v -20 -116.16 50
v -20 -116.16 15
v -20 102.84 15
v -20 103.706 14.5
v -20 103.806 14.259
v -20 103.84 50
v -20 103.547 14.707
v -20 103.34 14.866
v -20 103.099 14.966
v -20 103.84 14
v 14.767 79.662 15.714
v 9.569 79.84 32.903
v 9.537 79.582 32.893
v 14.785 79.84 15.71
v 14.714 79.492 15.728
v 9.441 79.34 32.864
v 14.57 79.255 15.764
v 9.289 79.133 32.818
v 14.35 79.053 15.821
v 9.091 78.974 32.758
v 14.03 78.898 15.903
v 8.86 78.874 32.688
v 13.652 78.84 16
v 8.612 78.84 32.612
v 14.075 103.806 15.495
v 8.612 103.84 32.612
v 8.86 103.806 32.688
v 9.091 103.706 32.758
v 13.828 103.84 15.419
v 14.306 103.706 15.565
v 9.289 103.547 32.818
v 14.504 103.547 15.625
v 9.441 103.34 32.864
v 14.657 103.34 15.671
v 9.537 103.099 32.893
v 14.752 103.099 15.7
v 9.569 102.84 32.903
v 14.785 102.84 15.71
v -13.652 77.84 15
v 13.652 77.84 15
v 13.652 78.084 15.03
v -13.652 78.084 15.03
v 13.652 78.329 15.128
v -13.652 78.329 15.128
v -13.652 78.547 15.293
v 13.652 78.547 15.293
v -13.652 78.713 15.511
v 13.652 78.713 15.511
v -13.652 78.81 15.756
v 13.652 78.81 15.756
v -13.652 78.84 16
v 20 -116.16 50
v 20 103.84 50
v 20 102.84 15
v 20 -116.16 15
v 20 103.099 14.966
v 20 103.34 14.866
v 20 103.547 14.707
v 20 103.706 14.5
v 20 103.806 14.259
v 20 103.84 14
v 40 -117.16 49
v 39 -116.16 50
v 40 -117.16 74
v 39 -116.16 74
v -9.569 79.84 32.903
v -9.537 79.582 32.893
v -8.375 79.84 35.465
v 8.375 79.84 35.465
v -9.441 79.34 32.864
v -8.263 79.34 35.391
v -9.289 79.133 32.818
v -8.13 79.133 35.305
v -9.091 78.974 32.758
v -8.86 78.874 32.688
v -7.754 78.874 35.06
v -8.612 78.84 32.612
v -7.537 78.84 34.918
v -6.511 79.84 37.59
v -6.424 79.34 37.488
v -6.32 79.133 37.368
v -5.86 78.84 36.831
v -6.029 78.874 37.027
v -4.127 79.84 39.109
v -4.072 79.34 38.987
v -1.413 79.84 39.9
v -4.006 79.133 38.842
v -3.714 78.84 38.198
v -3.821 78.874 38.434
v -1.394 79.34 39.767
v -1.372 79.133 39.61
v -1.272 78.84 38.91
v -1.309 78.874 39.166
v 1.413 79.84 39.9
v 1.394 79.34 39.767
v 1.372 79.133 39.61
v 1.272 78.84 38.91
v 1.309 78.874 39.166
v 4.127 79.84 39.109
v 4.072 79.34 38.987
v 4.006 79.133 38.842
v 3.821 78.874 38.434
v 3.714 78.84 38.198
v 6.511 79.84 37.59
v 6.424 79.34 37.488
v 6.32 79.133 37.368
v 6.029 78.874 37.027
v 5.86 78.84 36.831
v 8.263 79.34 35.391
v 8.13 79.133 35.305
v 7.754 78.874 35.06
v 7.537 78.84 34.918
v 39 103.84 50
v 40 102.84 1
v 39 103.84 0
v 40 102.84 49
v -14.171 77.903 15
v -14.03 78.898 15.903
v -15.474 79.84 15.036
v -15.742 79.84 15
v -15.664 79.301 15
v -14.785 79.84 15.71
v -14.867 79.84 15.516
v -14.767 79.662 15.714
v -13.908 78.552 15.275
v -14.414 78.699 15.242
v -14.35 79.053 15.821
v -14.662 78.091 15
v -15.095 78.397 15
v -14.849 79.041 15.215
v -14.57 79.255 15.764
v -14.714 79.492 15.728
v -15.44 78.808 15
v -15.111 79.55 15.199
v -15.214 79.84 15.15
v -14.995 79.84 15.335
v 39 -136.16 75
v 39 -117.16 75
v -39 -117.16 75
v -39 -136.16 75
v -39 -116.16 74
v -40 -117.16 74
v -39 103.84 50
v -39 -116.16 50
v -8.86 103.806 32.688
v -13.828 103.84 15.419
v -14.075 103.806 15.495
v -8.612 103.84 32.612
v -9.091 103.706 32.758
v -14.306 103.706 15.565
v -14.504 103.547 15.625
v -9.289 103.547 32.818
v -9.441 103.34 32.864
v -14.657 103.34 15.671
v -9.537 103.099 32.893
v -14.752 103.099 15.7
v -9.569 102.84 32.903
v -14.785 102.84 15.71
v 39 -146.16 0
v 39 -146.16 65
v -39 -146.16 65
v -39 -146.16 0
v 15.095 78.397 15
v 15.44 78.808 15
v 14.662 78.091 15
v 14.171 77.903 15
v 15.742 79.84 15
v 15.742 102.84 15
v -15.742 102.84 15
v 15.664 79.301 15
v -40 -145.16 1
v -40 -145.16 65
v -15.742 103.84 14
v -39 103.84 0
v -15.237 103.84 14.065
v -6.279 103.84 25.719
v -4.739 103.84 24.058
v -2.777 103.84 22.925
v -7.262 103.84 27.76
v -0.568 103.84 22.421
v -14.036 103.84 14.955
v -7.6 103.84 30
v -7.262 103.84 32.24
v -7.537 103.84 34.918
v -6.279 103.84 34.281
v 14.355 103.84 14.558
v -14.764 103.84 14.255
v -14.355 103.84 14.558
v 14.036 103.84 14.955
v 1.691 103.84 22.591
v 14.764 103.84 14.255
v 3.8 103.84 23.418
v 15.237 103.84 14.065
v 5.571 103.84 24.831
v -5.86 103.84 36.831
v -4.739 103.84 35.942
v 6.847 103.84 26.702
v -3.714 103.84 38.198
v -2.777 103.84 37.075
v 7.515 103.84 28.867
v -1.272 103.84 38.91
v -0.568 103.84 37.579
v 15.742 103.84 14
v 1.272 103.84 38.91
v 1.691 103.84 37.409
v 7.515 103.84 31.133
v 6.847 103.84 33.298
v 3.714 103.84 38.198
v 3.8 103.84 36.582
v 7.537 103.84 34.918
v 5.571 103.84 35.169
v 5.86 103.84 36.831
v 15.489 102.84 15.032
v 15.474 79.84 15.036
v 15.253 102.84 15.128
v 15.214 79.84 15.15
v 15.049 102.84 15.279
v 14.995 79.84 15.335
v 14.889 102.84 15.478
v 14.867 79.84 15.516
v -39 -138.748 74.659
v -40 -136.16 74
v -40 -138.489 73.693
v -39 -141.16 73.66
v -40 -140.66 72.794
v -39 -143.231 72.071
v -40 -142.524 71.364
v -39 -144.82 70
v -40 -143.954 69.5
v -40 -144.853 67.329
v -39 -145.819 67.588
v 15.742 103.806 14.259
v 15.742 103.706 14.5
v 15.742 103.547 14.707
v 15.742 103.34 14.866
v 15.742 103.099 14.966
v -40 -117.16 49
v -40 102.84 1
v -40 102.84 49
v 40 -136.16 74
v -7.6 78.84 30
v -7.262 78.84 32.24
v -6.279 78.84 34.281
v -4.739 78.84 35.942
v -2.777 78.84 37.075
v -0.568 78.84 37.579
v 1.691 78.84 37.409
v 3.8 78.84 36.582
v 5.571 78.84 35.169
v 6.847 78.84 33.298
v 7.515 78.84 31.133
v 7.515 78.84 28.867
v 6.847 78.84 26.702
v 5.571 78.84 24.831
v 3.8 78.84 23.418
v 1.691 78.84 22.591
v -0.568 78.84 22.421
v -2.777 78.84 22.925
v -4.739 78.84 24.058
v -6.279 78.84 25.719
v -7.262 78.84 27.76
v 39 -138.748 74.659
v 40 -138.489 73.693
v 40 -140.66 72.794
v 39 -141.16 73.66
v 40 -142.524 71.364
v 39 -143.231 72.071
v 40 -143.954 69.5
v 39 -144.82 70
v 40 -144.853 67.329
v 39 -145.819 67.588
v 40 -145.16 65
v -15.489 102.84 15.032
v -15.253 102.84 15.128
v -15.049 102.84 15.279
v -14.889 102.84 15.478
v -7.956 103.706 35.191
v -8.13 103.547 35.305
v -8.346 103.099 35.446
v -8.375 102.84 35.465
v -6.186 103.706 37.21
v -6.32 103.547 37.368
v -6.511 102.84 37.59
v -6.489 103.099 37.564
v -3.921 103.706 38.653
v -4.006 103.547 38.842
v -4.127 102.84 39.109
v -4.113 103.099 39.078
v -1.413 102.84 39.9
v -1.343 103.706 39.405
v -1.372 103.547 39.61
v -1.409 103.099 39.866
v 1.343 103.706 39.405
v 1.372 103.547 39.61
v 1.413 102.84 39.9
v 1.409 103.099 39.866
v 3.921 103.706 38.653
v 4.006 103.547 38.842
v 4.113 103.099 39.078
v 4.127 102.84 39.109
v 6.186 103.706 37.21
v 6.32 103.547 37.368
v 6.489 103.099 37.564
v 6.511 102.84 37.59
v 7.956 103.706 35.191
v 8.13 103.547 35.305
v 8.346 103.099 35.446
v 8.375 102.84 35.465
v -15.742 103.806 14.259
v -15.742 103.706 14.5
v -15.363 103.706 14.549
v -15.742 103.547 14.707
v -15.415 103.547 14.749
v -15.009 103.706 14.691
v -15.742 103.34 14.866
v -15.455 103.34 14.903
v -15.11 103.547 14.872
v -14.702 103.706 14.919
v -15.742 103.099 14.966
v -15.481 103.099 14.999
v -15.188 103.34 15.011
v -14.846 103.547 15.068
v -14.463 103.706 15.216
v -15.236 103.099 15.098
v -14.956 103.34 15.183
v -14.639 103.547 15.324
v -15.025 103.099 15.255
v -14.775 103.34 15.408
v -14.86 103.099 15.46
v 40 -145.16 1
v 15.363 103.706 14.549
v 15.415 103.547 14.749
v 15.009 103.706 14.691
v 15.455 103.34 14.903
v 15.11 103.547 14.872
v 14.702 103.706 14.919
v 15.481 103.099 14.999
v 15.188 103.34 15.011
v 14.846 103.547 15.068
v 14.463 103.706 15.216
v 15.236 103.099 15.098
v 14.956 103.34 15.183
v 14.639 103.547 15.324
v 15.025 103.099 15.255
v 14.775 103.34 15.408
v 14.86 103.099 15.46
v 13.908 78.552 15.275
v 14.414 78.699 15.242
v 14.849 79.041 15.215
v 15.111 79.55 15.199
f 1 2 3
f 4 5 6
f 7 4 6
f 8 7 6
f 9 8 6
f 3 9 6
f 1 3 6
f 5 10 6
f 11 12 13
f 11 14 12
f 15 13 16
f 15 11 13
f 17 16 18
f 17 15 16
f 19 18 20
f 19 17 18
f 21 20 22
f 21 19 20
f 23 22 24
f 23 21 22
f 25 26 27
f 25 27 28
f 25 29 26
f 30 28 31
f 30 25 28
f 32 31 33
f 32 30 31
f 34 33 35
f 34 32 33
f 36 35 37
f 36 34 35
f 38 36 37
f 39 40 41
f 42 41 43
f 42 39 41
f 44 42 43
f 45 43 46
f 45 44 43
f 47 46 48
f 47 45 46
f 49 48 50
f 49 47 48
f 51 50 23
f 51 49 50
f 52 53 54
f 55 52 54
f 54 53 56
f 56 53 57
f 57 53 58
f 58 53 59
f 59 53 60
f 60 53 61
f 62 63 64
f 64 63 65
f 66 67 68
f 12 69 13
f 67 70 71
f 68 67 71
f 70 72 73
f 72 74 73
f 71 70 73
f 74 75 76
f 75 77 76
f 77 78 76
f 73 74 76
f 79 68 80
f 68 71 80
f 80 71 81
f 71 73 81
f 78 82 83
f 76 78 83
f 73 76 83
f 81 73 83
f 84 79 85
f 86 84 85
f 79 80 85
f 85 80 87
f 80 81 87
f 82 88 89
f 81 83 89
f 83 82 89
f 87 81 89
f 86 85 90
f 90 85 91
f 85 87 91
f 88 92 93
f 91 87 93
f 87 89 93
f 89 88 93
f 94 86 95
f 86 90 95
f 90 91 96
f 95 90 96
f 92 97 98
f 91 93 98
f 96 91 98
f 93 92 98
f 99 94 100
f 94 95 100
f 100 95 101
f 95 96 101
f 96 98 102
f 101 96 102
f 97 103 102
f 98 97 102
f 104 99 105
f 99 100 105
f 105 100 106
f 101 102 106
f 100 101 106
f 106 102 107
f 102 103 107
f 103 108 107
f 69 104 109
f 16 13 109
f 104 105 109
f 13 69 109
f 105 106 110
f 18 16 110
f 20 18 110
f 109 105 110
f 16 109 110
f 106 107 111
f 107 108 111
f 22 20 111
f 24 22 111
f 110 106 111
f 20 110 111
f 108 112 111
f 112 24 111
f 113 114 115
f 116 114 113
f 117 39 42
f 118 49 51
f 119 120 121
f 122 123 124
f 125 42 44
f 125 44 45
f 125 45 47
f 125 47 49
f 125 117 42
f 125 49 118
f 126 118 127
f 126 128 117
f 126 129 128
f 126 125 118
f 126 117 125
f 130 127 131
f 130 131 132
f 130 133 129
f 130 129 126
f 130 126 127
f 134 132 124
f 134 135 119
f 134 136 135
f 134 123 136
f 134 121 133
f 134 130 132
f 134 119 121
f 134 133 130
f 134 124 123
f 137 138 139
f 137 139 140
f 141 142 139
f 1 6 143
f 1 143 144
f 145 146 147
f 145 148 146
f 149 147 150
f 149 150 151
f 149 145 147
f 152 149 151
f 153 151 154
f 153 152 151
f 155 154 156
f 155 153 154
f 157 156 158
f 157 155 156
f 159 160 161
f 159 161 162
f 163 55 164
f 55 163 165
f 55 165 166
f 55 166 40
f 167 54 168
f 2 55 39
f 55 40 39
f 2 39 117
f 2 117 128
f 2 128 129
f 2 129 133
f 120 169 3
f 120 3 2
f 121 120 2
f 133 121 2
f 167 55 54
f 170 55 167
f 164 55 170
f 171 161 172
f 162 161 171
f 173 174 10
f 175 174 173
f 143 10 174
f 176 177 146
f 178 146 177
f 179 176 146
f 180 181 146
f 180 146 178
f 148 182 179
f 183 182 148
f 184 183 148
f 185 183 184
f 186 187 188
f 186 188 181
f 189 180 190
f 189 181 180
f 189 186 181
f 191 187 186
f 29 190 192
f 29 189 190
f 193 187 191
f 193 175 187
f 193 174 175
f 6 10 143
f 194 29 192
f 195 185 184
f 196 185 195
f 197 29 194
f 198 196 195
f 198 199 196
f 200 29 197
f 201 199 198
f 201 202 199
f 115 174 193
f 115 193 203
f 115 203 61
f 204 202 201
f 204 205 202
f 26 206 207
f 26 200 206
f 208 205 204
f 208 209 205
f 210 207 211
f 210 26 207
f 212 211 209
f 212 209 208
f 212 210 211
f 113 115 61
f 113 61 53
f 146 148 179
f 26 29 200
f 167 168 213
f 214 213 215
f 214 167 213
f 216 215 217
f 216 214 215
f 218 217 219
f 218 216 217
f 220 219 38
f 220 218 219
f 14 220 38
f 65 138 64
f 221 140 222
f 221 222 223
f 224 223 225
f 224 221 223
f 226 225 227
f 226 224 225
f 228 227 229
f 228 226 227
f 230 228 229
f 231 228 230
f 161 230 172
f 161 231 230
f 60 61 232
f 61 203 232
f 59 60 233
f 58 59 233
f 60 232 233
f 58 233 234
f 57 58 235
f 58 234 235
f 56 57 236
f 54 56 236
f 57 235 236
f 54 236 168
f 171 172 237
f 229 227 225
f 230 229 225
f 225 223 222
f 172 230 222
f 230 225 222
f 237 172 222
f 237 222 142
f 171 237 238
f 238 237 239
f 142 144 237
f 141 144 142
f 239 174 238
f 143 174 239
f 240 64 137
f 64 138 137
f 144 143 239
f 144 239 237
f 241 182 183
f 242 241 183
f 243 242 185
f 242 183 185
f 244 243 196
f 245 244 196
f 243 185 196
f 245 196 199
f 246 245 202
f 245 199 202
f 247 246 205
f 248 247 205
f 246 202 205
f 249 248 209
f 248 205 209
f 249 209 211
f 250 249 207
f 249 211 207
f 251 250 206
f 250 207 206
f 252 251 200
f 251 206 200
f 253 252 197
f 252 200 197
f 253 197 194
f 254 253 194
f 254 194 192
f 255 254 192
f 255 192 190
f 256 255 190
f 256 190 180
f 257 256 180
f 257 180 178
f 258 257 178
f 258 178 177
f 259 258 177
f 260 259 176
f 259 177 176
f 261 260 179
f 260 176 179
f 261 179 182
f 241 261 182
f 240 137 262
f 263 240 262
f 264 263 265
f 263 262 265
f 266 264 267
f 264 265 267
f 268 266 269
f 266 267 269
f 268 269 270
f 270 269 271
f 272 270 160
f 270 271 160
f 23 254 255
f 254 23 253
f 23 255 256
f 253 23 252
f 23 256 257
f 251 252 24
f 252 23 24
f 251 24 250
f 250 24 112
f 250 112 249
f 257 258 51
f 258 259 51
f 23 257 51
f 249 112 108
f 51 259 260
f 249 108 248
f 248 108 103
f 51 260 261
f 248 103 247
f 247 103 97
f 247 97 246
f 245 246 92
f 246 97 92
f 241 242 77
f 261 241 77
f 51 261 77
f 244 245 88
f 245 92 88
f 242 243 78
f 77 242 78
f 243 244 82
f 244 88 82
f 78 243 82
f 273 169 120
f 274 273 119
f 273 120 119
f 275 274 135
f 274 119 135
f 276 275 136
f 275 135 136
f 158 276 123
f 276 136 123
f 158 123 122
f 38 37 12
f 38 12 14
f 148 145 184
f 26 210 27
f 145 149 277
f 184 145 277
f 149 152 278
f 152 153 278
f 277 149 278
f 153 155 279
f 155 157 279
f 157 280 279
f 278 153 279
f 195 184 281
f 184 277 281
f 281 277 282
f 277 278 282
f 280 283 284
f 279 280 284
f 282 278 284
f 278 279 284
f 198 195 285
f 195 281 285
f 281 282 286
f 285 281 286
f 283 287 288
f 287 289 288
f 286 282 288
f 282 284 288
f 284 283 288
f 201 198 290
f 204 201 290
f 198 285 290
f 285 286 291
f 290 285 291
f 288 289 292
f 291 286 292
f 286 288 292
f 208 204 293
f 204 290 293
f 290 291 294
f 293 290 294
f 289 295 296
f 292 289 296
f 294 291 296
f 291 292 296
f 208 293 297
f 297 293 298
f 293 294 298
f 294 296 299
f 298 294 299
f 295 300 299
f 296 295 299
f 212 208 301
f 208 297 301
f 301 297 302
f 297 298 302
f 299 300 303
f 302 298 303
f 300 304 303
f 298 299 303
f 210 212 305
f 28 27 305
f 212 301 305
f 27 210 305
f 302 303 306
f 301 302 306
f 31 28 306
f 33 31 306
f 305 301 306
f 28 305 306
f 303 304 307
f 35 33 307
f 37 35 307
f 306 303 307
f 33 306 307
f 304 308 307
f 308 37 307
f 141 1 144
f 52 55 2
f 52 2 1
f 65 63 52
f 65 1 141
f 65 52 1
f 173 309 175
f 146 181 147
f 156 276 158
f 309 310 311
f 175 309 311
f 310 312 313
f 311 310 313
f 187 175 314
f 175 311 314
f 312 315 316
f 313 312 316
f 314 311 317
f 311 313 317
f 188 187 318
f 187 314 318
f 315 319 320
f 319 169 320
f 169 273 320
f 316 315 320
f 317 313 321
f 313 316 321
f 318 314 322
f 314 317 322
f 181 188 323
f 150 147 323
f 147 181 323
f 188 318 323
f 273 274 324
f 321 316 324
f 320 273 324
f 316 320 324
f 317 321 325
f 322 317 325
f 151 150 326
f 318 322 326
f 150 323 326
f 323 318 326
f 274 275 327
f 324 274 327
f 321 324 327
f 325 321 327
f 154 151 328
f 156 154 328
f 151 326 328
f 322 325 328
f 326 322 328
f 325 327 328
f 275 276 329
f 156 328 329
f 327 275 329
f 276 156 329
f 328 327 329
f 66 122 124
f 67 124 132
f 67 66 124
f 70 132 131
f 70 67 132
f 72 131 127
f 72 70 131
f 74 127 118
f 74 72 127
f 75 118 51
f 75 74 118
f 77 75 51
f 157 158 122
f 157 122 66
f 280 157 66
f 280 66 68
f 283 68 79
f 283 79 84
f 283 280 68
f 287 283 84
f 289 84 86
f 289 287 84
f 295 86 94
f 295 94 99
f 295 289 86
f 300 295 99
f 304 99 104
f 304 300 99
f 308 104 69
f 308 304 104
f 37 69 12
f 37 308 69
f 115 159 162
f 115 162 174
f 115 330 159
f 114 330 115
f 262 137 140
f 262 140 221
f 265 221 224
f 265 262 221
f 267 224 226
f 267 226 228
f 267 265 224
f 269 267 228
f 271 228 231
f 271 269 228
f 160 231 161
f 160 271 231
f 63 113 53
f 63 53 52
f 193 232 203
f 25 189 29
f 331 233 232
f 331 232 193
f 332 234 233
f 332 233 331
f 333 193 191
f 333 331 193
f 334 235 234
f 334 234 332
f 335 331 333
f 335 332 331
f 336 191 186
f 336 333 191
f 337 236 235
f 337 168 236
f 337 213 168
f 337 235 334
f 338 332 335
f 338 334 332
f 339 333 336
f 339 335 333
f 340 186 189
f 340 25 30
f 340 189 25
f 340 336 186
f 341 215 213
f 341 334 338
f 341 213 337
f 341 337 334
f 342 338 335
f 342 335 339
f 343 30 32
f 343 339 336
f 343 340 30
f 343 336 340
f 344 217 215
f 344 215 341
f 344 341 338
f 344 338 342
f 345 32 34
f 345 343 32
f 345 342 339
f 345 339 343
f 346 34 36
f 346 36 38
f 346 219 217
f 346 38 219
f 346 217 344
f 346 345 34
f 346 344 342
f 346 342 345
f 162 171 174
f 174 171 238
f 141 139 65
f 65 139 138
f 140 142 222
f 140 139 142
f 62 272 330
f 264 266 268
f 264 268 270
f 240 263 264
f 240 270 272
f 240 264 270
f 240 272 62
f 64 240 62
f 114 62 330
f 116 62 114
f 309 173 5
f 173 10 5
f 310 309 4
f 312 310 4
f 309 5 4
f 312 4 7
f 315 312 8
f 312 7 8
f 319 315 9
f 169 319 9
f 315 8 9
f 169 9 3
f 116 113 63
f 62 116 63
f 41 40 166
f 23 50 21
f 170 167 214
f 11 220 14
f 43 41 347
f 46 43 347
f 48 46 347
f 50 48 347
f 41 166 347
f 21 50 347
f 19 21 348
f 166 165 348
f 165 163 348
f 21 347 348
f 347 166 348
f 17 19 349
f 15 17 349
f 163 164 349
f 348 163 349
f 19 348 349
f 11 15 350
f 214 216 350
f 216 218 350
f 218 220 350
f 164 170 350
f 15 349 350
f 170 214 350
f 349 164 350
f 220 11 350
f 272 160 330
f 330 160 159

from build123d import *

# Parameters (mm, degrees)
F1_DEPTH = 40
F2_R     = 7.6
F3_DEPTH = 220
F4_DEPTH = 25
F5_SIZE  = 1
F6_R     = 1


with BuildPart() as f1:
    # F0 (on Right) → F1 (new body, symmetric)
    with BuildSketch(Plane.YZ):
        with BuildLine():
            Line((-146.159631235, 0), (0, 0))
            Line((0, 0), (45.9261649855, 0))
            Line((45.9261649855, 0), (103.840368765, 0))
            Line((103.840368765, 0), (103.840368765, 50))
            Line((103.840368765, 50), (-116.159631235, 50))
            Line((-116.159631235, 50), (-116.159631235, 75))
            Line((-116.159631235, 75), (-136.159631235, 75))
            ThreePointArc((-136.159631235, 75), (-143.2306990468, 72.0710678119), (-146.159631235, 65))
            Line((-146.159631235, 65), (-146.159631235, 0))
        make_face()
    extrude(amount=F1_DEPTH, both=True)

    # F2 (on face) → F3 (cut, through all)
    with BuildSketch(Plane(origin=(0, 103.840368765, 0), x_dir=(-1, 0, 0), z_dir=(0, 1, 0))):
        with BuildLine():
            Line((20, 15), (20, 50))
            Line((20, 50), (-20, 50))
            Line((-20, 50), (-20, 15))
            Line((-20, 15), (-15, 15))
            Line((-15, 15), (-9.569428978, 32.9027623113))
            ThreePointArc((-9.569428978, 32.9027623113), (0, 40), (9.569428978, 32.9027623113))
            Line((9.569428978, 32.9027623113), (15, 15))
            Line((15, 15), (20, 15))
        make_face()
        with BuildLine():
            ThreePointArc((10, 30), (9.8917715749, 31.4672610914), (9.569428978, 32.9027623113))
            ThreePointArc((9.569428978, 32.9027623113), (0, 40), (-9.569428978, 32.9027623113))
            ThreePointArc((-9.569428978, 32.9027623113), (-1.4672610914, 20.1082284251), (10, 30))
        make_face()
        with Locations((0, 30)):
            Circle(F2_R, mode=Mode.SUBTRACT)
        with BuildLine():
            Line((-15, 15), (15, 15))
            Line((15, 15), (9.569428978, 32.9027623113))
            ThreePointArc((9.569428978, 32.9027623113), (9.8917715749, 31.4672610914), (10, 30))
            ThreePointArc((10, 30), (-1.4672610914, 20.1082284251), (-9.569428978, 32.9027623113))
            Line((-9.569428978, 32.9027623113), (-15, 15))
        make_face()
        with Locations((0, 30)):
            Circle(F2_R)
    extrude(amount=-F3_DEPTH, mode=Mode.SUBTRACT)

    # F2 (on face) → F4 (join)
    with BuildSketch(Plane(origin=(0, 103.840368765, 0), x_dir=(-1, 0, 0), z_dir=(0, 1, 0))):
        with BuildLine():
            Line((-15, 15), (15, 15))
            Line((15, 15), (9.569428978, 32.9027623113))
            ThreePointArc((9.569428978, 32.9027623113), (9.8917715749, 31.4672610914), (10, 30))
            ThreePointArc((10, 30), (-1.4672610914, 20.1082284251), (-9.569428978, 32.9027623113))
            Line((-9.569428978, 32.9027623113), (-15, 15))
        make_face()
        with BuildLine():
            ThreePointArc((10, 30), (9.8917715749, 31.4672610914), (9.569428978, 32.9027623113))
            ThreePointArc((9.569428978, 32.9027623113), (0, 40), (-9.569428978, 32.9027623113))
            ThreePointArc((-9.569428978, 32.9027623113), (-1.4672610914, 20.1082284251), (10, 30))
        make_face()
        with Locations((0, 30)):
            Circle(F2_R, mode=Mode.SUBTRACT)
    extrude(amount=-F4_DEPTH)

    # F5
    f5_edges = [f1.edges().sort_by_distance(p)[0] for p in [
        (-40, -146.159631, 32.5),
        (-40, -21.159631, 0),
        (-40, 103.840369, 25),
        (-40, -6.159631, 50),
        (-40, -116.159631, 62.5),
        (-40, -126.159631, 75),
        (-40, -143.230699, 72.071068),
        (0, -136.159631, 75),
        (40, -126.159631, 75),
        (0, -116.159631, 75),
        (40, -146.159631, 32.5),
        (40, -21.159631, 0),
        (40, 103.840369, 25),
        (40, -6.159631, 50),
        (40, -116.159631, 62.5),
        (40, -143.230699, 72.071068),
    ]]
    chamfer(f5_edges, length=F5_SIZE)

    # F6
    f6_edges = [f1.edges().sort_by_distance(p)[0] for p in [
        (-12.284714, 103.840369, 23.951381),
        (-15, 91.340369, 15),
        (15, 91.340369, 15),
        (0, 78.840369, 40),
        (-17.5, 103.840369, 15),
        (17.5, 103.840369, 15),
        (12.284714, 103.840369, 23.951381),
        (0, 103.840369, 40),
        (0, 78.840369, 15),
        (-12.284714, 78.840369, 23.951381),
        (12.284714, 78.840369, 23.951381),
    ]]
    fillet(f6_edges, radius=F6_R)


solid = f1.part
